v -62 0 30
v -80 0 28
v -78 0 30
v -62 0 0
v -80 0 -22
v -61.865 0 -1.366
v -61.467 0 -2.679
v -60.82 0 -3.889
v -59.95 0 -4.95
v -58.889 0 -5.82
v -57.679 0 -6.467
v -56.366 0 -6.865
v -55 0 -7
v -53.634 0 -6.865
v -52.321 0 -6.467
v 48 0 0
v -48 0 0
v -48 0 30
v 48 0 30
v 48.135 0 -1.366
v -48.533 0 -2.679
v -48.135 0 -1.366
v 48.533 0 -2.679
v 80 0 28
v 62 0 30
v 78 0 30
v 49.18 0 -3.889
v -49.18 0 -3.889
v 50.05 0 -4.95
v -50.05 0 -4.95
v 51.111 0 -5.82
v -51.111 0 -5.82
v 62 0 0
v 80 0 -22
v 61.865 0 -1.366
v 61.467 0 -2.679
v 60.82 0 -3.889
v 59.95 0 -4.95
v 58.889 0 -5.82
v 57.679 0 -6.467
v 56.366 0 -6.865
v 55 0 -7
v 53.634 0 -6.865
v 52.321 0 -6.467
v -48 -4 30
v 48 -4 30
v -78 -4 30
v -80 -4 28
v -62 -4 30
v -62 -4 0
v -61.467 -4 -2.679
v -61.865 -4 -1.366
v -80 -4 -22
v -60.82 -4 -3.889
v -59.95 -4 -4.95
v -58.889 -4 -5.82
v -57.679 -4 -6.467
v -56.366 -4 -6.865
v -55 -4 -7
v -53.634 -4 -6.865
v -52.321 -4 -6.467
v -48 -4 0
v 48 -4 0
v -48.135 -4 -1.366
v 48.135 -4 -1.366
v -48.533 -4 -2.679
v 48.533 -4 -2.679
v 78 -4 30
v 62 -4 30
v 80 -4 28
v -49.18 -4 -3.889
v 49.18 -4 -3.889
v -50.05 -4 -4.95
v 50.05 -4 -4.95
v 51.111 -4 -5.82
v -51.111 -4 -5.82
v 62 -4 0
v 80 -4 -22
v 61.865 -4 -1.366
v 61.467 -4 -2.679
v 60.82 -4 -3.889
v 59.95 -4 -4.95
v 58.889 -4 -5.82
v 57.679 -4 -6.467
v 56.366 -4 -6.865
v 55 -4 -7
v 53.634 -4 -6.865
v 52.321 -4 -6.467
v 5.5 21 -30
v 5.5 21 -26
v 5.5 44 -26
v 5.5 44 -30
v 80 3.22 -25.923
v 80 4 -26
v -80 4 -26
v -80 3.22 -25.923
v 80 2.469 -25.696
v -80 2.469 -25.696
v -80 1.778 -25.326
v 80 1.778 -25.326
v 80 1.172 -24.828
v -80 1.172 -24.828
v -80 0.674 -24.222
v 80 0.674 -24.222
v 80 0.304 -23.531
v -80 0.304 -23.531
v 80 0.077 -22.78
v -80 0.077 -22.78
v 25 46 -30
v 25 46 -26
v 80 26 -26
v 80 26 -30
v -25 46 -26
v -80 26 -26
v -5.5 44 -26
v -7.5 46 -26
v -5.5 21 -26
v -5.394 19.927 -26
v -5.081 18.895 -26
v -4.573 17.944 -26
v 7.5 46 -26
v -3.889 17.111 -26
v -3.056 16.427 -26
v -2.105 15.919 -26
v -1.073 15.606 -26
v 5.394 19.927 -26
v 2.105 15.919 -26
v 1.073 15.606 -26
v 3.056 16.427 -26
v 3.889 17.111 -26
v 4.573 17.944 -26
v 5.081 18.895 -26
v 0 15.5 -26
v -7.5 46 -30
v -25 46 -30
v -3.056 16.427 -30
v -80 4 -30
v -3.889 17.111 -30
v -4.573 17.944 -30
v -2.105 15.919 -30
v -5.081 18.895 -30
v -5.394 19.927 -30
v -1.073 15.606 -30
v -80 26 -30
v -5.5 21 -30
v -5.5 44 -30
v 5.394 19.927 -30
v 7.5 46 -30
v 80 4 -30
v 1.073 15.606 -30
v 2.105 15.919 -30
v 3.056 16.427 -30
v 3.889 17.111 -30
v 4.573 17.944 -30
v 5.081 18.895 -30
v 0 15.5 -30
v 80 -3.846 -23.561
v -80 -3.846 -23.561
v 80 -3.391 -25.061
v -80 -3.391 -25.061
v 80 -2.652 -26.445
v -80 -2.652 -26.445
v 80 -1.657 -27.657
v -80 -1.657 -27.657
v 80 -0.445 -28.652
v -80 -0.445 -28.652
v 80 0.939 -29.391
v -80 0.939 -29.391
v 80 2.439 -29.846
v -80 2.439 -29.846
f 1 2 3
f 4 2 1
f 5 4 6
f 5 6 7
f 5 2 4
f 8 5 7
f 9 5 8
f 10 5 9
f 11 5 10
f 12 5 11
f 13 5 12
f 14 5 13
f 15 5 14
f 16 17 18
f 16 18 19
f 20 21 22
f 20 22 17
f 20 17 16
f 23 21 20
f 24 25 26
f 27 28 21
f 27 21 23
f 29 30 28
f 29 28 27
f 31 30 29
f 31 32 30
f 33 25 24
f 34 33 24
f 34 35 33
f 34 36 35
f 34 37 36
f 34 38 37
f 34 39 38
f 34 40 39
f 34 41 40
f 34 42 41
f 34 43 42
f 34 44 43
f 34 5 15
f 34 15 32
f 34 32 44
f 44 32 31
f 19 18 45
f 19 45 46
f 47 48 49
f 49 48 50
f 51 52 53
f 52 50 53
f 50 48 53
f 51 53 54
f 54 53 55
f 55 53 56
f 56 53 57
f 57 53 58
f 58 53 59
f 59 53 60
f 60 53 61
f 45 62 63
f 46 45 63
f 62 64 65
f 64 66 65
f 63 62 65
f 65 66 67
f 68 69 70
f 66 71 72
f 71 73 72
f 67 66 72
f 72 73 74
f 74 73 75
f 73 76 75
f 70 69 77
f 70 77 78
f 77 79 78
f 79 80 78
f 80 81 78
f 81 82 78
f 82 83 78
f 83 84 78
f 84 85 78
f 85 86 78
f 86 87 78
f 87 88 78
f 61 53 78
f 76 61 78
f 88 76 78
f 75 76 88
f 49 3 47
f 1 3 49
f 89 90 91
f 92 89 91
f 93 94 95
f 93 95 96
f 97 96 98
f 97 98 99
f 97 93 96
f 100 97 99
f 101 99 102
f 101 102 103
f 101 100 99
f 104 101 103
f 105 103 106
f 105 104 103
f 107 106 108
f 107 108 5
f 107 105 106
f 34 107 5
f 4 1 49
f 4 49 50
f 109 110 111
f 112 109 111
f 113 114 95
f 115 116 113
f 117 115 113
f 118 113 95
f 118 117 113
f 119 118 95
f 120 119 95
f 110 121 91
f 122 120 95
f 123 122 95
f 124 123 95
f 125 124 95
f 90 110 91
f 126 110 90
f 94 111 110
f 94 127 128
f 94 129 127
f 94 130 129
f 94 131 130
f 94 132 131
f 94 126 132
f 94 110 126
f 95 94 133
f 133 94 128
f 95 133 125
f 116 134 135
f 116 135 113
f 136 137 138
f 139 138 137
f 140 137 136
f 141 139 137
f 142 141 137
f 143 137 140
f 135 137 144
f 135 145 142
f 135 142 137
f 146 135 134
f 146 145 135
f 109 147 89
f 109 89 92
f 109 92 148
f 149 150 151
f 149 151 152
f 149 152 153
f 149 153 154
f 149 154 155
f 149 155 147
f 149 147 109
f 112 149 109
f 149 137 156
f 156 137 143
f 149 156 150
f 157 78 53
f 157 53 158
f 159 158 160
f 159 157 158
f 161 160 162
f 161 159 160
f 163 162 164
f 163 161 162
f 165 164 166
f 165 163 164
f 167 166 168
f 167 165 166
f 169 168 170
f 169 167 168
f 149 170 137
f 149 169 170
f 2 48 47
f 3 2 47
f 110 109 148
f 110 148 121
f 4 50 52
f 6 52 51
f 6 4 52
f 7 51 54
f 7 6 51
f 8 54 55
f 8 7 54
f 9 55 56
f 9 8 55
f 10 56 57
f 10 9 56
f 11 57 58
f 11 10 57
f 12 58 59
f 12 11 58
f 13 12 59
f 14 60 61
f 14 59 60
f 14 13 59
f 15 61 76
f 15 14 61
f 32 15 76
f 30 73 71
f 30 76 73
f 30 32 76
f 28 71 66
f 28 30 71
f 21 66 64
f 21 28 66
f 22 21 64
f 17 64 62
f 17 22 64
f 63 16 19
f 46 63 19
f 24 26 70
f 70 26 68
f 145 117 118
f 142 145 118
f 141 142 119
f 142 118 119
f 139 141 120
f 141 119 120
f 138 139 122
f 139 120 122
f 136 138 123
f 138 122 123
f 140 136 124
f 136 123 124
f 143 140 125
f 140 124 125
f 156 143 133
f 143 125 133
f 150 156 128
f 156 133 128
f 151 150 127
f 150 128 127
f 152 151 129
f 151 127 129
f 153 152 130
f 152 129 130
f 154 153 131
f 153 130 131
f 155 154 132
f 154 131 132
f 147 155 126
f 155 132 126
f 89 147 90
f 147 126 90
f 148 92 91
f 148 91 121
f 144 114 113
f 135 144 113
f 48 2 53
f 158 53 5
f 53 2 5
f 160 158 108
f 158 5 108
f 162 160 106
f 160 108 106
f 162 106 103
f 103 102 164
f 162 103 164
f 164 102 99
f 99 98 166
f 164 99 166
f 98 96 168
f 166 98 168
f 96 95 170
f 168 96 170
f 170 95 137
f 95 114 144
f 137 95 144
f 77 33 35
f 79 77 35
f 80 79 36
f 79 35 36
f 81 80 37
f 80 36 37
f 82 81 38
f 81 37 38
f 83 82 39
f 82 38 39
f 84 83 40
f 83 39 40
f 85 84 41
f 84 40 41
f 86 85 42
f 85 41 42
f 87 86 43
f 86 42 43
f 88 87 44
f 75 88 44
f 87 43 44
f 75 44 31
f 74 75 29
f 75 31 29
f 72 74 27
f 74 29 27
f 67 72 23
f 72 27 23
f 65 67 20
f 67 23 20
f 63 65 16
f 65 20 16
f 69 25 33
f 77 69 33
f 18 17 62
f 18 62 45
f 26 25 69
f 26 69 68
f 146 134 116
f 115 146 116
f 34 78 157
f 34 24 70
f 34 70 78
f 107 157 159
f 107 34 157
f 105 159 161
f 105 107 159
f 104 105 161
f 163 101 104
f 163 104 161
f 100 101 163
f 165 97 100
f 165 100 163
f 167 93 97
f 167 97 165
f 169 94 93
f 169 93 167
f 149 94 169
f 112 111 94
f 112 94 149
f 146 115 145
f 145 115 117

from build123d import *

# Parameters (mm, degrees)
SKETCH2_W                    = 160
SKETCH2_H                    = 60
BASE_FLANGE1_DEPTH           = 4
CUT_EXTRUDE1_DEPTH           = 86.533619121
BREAK_CORNER1_START          = -77.781745931
BREAK_CORNER1_OUTLINE_W      = 114.367532368
BREAK_CORNER1_OUTLINE_H      = 6
BREAK_CORNER1_DEPTH          = 1.414213563
BREAK_CORNER1_START_2        = 33.941125497
BREAK_CORNER1_2_OUTLINE_W    = 1.632467632
BREAK_CORNER1_2_OUTLINE_H    = 6
BREAK_CORNER1_2_DEPTH        = 2.828427125
EDGE_FLANGE1_STRIP_W         = 24
EDGE_FLANGE1_STRIP_H         = 4
EDGE_FLANGE1_STRIP_CUT_DEPTH = 160
EDGE_FLANGE1_DEPTH           = 160
CUT_EXTRUDE2_DEPTH           = 108.944430148
BREAK_CORNER2_START          = -37.830212793
BREAK_CORNER2_OUTLINE_W      = 11.776388924
BREAK_CORNER2_OUTLINE_H      = 7
BREAK_CORNER2_DEPTH          = 10.606601717


# Read off the part's stored shape, not the designer's step: Break-Corner1, Break-Corner2
# Sheet-metal steps are written as plain solids
with BuildPart() as part:
    # Sketch2 → Base-Flange1 (new body)
    with BuildSketch(Plane(origin=(0, 0, 0), x_dir=(1, 0, 0), z_dir=(0, 1, 0))):
        Rectangle(SKETCH2_W, SKETCH2_H)
    extrude(amount=-BASE_FLANGE1_DEPTH)

    # Sketch8 → Cut-Extrude1 (cut, through all)
    with BuildSketch(Plane(origin=(0, 0, 0), x_dir=(1, 0, 0), z_dir=(0, 1, 0))):
        with BuildLine():
            Line((-48, 0), (-48, -31.405477162))
            Line((-48, -31.405477162), (-62, -31.405477162))
            Line((-62, -31.405477162), (-62, 0))
            ThreePointArc((-62, 0), (-55, 7), (-48, 0))
        make_face()
        with BuildLine():
            Line((62, -31.405477162), (62, 0))
            ThreePointArc((62, 0), (55, 7), (48, 0))
            Line((48, 0), (48, -31.405477162))
            Line((48, -31.405477162), (62, -31.405477162))
        make_face()
    extrude(amount=-CUT_EXTRUDE1_DEPTH, mode=Mode.SUBTRACT)

    # Break-Corner1 outline → Break-Corner1 (cut)
    with BuildSketch(Plane(origin=(0, 0, 0), x_dir=(0.707106781186548, 0, 0.707106781186547), z_dir=(0.707106781186547, 0, -0.707106781186548)).offset(BREAK_CORNER1_START)):
        with Locations((19.183766184, 2)):
            Rectangle(BREAK_CORNER1_OUTLINE_W, BREAK_CORNER1_OUTLINE_H)
    extrude(amount=BREAK_CORNER1_DEPTH, mode=Mode.SUBTRACT)

    # Break-Corner1 2 outline → Break-Corner1 2 (cut)
    with BuildSketch(Plane(origin=(0, 0, 0), x_dir=(0.707106781186548, 0, 0.707106781186547), z_dir=(0.707106781186547, 0, -0.707106781186548)).offset(BREAK_CORNER1_START_2)):
        with Locations((77.183766184, 2)):
            Rectangle(BREAK_CORNER1_2_OUTLINE_W, BREAK_CORNER1_2_OUTLINE_H)
    extrude(amount=BREAK_CORNER1_2_DEPTH, mode=Mode.SUBTRACT)

    # Edge-Flange1 strip (across the edge) → Edge-Flange1 strip cut (cut)
    with BuildSketch(Plane(origin=(80, 0, -30), x_dir=(0, 0, 1), z_dir=(-1, 0, 0))):
        with Locations((-4, -2)):
            Rectangle(EDGE_FLANGE1_STRIP_W, EDGE_FLANGE1_STRIP_H)
    extrude(amount=EDGE_FLANGE1_STRIP_CUT_DEPTH, mode=Mode.SUBTRACT)

    # Edge-Flange1 section (across the edge) → Edge-Flange1 (add)
    with BuildSketch(Plane(origin=(80, 0, -30), x_dir=(0, 0, 1), z_dir=(-1, 0, 0))):
        with BuildLine():
            Line((0, 4), (0, 46))
            Line((0, 46), (4, 46))
            Line((4, 46), (4, 4))
            ThreePointArc((4, 4), (5.171572875, 1.171572875), (8, 0))
            Line((8, 0), (8, -4))
            ThreePointArc((8, -4), (2.343145751, -1.656854249), (0, 4))
        make_face()
    extrude(amount=EDGE_FLANGE1_DEPTH)

    # Sketch14 → Cut-Extrude2 (cut, through all)
    with BuildSketch(Plane.XY.offset(-26)):
        with BuildLine():
            Line((5.5, 21), (5.5, 51.754335402))
            Line((5.5, 51.754335402), (-5.5, 51.754335402))
            Line((-5.5, 51.754335402), (-5.5, 21))
            ThreePointArc((-5.5, 21), (0, 15.5), (5.5, 21))
        make_face()
        Polygon((80, 26), (80, 46), (25, 46), align=None)
        Polygon((-80, 26), (-25, 46), (-80, 46), align=None)
    extrude(amount=-CUT_EXTRUDE2_DEPTH, mode=Mode.SUBTRACT)

    # Break-Corner2 outline → Break-Corner2 (cut)
    with BuildSketch(Plane(origin=(0, 0, 0), x_dir=(0.707106781186546, 0.707106781186549, 0), z_dir=(0.707106781186549, -0.707106781186546, 0)).offset(BREAK_CORNER2_START)):
        with Locations((33.111805538, -28.5)):
            Rectangle(BREAK_CORNER2_OUTLINE_W, BREAK_CORNER2_OUTLINE_H)
    extrude(amount=BREAK_CORNER2_DEPTH, mode=Mode.SUBTRACT)


solid = part.part
